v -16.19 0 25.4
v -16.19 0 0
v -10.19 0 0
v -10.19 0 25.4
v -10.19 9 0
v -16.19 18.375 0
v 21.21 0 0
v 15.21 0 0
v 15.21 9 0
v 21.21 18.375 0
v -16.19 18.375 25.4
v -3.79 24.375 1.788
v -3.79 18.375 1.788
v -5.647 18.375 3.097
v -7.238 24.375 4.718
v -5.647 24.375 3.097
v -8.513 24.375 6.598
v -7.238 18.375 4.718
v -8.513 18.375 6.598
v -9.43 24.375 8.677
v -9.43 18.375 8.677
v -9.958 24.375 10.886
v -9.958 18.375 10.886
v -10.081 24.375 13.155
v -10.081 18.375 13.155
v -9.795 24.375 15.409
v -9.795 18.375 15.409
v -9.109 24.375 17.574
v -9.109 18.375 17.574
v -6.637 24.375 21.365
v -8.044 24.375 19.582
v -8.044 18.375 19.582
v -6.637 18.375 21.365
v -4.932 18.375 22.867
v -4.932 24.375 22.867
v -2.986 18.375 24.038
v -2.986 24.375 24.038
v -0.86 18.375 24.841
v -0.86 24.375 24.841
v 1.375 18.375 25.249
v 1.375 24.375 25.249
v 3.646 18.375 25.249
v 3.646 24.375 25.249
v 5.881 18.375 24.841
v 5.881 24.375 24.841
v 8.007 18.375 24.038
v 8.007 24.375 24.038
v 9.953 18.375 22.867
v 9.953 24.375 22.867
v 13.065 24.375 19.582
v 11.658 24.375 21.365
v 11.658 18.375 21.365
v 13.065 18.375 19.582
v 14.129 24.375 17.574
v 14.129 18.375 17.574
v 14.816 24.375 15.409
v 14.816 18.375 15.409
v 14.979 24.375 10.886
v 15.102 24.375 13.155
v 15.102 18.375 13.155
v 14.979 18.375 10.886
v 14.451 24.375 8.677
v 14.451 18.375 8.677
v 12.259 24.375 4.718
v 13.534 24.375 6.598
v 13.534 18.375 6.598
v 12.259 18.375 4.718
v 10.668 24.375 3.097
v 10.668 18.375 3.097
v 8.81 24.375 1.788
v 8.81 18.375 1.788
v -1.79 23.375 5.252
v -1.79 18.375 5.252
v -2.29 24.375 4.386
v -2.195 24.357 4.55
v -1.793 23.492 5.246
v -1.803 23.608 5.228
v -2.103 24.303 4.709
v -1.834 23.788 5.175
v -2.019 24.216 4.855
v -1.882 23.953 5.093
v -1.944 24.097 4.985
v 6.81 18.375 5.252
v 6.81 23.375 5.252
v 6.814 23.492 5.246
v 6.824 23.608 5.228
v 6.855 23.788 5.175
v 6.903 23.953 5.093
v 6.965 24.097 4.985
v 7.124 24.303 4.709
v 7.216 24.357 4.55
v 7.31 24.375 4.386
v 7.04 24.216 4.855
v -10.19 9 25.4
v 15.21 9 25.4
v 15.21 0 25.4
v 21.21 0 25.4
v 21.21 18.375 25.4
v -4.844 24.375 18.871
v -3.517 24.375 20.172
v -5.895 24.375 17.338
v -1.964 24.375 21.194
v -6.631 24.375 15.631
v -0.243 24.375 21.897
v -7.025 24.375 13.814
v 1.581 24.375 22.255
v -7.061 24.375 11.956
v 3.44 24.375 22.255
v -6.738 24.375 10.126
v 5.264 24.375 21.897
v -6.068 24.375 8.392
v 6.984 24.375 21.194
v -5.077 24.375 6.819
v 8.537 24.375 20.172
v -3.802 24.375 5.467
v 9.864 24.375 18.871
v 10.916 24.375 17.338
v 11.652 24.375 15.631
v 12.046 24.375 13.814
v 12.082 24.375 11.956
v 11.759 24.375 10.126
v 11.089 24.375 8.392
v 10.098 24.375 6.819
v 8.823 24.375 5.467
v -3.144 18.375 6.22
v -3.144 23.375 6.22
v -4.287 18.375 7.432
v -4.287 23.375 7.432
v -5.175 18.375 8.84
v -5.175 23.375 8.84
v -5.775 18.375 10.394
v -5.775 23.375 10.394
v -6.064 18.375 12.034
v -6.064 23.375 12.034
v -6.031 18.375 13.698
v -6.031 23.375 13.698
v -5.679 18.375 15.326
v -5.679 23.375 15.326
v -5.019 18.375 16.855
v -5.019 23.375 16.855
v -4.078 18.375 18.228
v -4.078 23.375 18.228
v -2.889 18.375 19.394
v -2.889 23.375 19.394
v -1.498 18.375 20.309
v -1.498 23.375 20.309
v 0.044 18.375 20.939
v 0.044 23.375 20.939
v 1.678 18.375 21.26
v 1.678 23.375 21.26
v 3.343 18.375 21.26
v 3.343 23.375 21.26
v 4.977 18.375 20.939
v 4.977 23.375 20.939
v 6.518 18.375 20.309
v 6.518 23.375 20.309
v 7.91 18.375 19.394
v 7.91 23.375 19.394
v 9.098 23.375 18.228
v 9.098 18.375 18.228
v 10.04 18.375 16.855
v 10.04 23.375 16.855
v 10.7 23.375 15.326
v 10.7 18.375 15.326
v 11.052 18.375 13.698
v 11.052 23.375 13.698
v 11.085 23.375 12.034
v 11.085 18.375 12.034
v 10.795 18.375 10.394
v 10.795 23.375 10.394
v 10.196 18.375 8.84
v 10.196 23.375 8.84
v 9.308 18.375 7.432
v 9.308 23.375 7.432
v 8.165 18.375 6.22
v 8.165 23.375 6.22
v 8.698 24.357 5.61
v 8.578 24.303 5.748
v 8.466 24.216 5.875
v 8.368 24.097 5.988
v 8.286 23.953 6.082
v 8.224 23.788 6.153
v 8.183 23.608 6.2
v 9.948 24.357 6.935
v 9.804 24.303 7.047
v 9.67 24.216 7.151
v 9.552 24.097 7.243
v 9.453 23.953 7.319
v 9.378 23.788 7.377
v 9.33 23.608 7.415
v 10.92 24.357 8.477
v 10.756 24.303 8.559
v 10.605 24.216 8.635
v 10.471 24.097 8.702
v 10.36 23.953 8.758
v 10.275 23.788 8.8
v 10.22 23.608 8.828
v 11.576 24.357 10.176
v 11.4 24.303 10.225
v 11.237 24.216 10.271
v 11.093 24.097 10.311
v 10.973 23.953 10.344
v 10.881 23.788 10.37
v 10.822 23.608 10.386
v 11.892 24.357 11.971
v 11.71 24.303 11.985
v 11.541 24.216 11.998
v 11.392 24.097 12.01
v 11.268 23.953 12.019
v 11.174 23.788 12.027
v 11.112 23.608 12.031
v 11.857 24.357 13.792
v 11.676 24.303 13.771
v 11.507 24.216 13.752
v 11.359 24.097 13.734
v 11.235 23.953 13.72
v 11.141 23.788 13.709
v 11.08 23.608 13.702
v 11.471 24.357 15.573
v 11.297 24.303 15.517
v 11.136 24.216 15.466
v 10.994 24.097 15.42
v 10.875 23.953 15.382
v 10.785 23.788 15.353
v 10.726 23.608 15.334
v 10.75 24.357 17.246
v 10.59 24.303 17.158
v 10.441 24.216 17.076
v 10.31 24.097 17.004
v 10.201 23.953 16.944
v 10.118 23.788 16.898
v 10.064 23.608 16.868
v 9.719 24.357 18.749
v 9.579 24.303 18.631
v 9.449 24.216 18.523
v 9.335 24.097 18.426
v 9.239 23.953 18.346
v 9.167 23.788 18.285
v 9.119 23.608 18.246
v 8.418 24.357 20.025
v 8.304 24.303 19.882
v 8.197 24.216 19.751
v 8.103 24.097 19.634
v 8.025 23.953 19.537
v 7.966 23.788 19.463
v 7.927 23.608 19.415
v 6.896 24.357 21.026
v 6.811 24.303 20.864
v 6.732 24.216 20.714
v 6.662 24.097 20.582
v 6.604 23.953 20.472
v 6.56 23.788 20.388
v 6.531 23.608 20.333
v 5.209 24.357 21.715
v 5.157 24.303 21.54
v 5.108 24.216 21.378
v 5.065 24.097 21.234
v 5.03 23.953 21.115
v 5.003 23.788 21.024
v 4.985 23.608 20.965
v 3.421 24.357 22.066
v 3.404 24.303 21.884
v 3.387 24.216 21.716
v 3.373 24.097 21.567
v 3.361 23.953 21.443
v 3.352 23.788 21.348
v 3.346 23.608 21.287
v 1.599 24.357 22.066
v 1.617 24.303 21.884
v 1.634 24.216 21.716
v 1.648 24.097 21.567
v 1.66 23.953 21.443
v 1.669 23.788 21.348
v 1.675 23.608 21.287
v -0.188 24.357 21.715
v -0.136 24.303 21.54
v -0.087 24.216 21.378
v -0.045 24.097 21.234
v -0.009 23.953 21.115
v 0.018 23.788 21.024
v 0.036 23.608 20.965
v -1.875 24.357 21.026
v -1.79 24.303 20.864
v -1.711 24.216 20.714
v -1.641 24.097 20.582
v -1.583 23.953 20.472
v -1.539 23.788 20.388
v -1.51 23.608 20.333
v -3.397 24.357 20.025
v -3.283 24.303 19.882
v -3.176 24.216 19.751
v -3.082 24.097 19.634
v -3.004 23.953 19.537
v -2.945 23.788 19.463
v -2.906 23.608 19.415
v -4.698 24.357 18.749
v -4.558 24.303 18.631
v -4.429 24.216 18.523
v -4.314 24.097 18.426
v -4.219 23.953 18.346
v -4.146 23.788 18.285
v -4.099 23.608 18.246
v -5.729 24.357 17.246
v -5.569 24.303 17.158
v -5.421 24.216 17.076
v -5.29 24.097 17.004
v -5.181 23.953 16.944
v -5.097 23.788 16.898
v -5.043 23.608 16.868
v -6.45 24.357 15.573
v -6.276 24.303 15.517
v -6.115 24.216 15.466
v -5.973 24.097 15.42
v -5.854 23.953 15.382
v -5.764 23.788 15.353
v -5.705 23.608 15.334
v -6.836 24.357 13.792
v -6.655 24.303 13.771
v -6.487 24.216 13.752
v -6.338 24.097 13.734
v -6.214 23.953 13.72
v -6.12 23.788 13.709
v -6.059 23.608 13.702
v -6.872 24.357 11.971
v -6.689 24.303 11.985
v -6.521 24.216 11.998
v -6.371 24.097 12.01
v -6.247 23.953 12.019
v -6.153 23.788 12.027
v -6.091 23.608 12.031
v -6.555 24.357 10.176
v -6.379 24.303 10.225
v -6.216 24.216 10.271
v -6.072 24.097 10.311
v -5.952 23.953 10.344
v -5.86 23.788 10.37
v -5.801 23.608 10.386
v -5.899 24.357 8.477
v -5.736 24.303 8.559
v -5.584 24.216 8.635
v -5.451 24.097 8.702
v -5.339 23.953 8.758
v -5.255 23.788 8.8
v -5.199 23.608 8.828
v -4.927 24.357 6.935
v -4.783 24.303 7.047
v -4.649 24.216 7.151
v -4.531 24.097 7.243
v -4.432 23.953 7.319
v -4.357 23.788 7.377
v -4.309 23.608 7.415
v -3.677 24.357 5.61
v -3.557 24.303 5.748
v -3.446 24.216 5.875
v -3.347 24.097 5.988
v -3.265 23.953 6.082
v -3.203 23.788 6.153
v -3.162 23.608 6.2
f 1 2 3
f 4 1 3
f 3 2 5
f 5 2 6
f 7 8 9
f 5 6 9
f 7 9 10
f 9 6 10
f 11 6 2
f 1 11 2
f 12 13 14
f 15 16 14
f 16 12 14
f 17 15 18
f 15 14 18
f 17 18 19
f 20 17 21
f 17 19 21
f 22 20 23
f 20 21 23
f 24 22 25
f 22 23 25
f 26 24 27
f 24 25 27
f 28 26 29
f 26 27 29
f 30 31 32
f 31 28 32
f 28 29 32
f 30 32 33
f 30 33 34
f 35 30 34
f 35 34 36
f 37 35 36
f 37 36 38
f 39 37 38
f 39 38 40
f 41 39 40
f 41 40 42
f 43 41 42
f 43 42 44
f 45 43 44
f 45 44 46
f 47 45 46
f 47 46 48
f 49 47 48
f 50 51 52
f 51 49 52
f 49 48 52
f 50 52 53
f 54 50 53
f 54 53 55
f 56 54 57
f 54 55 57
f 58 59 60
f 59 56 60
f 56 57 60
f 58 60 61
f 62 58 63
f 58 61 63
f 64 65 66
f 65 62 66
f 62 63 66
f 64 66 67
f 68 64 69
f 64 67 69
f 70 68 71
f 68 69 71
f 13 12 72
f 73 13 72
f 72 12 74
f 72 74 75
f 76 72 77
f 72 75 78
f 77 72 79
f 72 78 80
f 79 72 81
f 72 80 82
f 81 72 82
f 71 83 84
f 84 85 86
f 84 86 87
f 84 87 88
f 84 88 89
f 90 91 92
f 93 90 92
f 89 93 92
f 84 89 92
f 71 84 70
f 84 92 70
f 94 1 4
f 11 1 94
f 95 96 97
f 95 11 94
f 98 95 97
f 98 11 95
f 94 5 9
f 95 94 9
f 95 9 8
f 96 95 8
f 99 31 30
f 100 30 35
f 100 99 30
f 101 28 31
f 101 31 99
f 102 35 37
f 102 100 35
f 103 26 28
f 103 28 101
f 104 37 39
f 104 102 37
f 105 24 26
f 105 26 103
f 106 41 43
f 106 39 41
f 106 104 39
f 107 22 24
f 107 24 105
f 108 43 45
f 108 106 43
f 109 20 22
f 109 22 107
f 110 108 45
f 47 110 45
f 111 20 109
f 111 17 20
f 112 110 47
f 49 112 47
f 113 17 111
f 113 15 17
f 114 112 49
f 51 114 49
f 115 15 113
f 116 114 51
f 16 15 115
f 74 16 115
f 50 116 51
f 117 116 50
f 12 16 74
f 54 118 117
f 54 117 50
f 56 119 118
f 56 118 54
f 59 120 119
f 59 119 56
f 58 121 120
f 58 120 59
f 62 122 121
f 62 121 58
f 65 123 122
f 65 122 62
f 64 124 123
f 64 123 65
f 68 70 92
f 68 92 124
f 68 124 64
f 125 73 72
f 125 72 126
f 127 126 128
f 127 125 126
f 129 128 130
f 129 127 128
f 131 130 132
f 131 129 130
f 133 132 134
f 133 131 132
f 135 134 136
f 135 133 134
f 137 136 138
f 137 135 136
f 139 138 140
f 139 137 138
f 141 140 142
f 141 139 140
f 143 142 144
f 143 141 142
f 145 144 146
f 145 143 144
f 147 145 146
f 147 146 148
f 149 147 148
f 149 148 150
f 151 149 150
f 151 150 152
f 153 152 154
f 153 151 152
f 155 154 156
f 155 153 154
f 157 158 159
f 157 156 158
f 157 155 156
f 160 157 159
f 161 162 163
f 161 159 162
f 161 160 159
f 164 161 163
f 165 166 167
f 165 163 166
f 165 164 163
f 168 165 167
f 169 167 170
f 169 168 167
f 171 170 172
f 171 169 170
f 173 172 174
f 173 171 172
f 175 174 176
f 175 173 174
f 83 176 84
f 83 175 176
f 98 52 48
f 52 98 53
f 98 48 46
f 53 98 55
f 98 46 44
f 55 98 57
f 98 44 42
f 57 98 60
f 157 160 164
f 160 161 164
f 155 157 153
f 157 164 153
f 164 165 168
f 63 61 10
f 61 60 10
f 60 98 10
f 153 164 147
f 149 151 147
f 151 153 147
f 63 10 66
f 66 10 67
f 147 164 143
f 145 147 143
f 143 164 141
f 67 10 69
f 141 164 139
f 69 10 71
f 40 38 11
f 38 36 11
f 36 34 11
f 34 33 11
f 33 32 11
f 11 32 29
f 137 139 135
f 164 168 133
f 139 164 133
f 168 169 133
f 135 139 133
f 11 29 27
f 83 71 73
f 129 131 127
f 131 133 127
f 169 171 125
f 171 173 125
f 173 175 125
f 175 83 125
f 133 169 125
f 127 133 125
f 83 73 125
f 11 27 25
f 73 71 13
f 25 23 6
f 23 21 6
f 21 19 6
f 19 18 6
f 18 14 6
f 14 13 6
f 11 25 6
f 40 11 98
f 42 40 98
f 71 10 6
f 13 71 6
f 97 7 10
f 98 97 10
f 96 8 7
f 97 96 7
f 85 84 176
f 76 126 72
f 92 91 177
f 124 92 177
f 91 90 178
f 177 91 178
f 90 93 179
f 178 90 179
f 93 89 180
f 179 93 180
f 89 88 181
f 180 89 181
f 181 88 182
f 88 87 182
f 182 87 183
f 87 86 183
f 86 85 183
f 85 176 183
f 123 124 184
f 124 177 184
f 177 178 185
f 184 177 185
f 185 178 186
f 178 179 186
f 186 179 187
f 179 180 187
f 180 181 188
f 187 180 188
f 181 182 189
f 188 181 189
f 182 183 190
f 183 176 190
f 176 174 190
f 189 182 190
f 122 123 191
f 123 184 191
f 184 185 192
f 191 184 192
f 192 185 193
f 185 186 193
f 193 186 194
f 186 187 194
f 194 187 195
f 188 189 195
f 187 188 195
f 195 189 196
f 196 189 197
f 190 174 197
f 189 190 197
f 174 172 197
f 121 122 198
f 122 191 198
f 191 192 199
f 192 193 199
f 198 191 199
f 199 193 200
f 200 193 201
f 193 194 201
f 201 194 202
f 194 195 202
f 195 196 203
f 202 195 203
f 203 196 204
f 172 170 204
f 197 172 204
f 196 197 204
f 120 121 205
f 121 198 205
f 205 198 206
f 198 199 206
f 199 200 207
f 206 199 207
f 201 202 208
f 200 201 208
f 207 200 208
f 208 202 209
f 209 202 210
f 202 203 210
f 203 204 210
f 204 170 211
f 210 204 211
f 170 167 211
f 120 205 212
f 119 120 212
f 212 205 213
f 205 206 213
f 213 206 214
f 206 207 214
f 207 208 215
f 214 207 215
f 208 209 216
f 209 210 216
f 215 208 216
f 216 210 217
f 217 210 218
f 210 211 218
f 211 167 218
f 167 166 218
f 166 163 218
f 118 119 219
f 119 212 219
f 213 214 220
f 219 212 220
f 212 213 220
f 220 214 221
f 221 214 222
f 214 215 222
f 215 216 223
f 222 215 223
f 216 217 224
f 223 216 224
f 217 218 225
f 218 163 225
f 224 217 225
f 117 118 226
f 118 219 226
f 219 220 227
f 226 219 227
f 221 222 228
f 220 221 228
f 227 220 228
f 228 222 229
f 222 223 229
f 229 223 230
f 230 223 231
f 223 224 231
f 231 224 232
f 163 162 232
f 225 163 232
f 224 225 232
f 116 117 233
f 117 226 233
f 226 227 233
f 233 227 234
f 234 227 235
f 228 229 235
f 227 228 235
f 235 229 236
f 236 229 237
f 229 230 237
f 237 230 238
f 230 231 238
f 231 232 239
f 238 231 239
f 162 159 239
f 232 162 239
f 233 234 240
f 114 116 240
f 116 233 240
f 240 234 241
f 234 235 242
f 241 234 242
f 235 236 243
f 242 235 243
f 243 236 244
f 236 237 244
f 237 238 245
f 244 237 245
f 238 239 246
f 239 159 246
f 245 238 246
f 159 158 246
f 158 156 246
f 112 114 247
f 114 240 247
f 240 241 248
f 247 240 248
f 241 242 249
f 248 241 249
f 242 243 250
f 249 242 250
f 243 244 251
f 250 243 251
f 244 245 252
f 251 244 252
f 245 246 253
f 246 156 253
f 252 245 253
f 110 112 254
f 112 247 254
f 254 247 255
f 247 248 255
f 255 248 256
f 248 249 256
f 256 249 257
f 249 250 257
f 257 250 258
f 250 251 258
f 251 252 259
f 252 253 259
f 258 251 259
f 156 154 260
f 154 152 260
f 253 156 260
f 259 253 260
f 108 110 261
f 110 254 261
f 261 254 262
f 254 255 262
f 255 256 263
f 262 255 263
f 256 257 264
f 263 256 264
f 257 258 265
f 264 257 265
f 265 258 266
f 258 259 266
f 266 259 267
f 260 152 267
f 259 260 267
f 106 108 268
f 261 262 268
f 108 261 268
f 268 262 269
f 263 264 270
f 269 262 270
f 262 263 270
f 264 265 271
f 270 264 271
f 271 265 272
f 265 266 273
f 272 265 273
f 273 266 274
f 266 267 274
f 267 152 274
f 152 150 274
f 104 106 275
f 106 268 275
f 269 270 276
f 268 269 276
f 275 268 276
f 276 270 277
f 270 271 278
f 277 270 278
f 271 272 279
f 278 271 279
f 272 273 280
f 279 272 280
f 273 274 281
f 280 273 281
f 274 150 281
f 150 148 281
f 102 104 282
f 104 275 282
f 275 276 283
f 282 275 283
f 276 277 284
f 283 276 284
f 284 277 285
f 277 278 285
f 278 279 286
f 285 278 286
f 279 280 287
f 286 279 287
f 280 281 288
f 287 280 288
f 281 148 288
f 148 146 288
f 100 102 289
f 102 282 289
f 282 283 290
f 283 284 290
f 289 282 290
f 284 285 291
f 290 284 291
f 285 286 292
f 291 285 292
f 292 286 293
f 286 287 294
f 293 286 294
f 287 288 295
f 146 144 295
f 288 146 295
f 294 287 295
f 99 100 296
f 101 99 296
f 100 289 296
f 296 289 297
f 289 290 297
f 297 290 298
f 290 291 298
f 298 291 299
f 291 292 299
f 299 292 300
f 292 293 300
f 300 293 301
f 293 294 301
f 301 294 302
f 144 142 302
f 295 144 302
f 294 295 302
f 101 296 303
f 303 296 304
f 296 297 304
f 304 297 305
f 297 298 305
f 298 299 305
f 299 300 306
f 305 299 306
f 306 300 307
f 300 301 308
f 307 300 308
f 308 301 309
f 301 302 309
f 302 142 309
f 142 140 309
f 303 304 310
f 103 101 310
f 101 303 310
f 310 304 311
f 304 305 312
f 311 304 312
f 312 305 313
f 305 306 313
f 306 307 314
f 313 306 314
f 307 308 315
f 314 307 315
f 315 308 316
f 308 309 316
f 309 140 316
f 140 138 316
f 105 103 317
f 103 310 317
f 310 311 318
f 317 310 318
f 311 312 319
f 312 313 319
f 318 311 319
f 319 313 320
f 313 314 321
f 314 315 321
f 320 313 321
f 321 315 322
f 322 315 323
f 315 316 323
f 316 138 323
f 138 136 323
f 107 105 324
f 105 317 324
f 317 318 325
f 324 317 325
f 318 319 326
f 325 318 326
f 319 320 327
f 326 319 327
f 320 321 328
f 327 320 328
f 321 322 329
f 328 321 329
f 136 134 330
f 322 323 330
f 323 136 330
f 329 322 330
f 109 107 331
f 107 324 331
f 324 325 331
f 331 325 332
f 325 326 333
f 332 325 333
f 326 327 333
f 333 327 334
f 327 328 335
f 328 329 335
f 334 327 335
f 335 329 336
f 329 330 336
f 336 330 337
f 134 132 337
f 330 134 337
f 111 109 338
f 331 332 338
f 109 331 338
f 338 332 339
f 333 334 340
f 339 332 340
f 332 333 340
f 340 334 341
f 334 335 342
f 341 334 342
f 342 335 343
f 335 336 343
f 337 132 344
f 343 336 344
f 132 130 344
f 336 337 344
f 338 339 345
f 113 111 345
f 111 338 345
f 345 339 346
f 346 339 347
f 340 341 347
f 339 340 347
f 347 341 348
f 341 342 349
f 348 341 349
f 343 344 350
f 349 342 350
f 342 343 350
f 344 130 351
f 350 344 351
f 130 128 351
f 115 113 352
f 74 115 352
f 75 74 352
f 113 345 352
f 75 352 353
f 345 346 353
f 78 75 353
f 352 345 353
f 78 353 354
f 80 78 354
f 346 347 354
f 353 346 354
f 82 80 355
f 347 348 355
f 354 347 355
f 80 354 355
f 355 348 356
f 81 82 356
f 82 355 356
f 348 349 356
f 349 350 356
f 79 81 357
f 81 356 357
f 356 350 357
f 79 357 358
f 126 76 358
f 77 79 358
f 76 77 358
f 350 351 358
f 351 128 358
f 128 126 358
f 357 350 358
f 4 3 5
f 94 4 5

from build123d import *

# Parameters (mm, degrees)
BOSS_EXTRUDE1_DEPTH = 25.4
SKETCH2_R           = 12.6
SKETCH2_R_2         = 8.6
BOSS_EXTRUDE2_DEPTH = 6
CUT_EXTRUDE1_DEPTH  = 6
FILLET1_R           = 1


with BuildPart() as part:
    # Sketch1 → Boss-Extrude1 (new body)
    with BuildSketch(Plane.XY):
        Polygon((-10.189534884, 0), (-10.189534884, 9), (15.210465116, 9), (15.210465116, 0), (21.210465116, 0), (21.210465116, 18.375), (-16.189534884, 18.375), (-16.189534884, 0), align=None)
    extrude(amount=BOSS_EXTRUDE1_DEPTH)

    # Sketch2 → Boss-Extrude2 (add)
    with BuildSketch(Plane(origin=(0, 18.375, 0), x_dir=(1, 0, 0), z_dir=(0, 1, 0))):
        with Locations((2.510465116, -12.7)):
            Circle(SKETCH2_R)
        with Locations((2.510465116, -12.7)):
            Circle(SKETCH2_R_2, mode=Mode.SUBTRACT)
    extrude(amount=BOSS_EXTRUDE2_DEPTH)

    # Sketch3 → Cut-Extrude1 (cut)
    with BuildSketch(Plane(origin=(0, 24.375, 0), x_dir=(1, 0, 0), z_dir=(0, 1, 0))):
        with BuildLine():
            ThreePointArc((-1.789534884, -5.252181527), (0.284621328, -4.393037894), (2.510465116, -4.1))
            Line((2.510465116, -4.1), (2.510465116, -0.1))
            ThreePointArc((2.510465116, -0.1), (-0.750654852, -0.529334589), (-3.789534884, -1.788079912))
            Line((-3.789534884, -1.788079912), (-1.789534884, -5.252181527))
        make_face()
        with BuildLine():
            Line((2.510465116, -0.1), (2.510465116, -4.1))
            ThreePointArc((2.510465116, -4.1), (4.736308904, -4.393037894), (6.810465116, -5.252181527))
            Line((6.810465116, -5.252181527), (8.810465116, -1.788079912))
            ThreePointArc((8.810465116, -1.788079912), (5.771585085, -0.529334589), (2.510465116, -0.1))
        make_face()
    extrude(amount=-CUT_EXTRUDE1_DEPTH, mode=Mode.SUBTRACT)

    # Fillet1
    fillet1_edges = [part.edges().sort_by_distance(p)[0] for p in [
        (2.510465116, 24.375, 21.3),
    ]]
    fillet(fillet1_edges, radius=FILLET1_R)


solid = part.part
